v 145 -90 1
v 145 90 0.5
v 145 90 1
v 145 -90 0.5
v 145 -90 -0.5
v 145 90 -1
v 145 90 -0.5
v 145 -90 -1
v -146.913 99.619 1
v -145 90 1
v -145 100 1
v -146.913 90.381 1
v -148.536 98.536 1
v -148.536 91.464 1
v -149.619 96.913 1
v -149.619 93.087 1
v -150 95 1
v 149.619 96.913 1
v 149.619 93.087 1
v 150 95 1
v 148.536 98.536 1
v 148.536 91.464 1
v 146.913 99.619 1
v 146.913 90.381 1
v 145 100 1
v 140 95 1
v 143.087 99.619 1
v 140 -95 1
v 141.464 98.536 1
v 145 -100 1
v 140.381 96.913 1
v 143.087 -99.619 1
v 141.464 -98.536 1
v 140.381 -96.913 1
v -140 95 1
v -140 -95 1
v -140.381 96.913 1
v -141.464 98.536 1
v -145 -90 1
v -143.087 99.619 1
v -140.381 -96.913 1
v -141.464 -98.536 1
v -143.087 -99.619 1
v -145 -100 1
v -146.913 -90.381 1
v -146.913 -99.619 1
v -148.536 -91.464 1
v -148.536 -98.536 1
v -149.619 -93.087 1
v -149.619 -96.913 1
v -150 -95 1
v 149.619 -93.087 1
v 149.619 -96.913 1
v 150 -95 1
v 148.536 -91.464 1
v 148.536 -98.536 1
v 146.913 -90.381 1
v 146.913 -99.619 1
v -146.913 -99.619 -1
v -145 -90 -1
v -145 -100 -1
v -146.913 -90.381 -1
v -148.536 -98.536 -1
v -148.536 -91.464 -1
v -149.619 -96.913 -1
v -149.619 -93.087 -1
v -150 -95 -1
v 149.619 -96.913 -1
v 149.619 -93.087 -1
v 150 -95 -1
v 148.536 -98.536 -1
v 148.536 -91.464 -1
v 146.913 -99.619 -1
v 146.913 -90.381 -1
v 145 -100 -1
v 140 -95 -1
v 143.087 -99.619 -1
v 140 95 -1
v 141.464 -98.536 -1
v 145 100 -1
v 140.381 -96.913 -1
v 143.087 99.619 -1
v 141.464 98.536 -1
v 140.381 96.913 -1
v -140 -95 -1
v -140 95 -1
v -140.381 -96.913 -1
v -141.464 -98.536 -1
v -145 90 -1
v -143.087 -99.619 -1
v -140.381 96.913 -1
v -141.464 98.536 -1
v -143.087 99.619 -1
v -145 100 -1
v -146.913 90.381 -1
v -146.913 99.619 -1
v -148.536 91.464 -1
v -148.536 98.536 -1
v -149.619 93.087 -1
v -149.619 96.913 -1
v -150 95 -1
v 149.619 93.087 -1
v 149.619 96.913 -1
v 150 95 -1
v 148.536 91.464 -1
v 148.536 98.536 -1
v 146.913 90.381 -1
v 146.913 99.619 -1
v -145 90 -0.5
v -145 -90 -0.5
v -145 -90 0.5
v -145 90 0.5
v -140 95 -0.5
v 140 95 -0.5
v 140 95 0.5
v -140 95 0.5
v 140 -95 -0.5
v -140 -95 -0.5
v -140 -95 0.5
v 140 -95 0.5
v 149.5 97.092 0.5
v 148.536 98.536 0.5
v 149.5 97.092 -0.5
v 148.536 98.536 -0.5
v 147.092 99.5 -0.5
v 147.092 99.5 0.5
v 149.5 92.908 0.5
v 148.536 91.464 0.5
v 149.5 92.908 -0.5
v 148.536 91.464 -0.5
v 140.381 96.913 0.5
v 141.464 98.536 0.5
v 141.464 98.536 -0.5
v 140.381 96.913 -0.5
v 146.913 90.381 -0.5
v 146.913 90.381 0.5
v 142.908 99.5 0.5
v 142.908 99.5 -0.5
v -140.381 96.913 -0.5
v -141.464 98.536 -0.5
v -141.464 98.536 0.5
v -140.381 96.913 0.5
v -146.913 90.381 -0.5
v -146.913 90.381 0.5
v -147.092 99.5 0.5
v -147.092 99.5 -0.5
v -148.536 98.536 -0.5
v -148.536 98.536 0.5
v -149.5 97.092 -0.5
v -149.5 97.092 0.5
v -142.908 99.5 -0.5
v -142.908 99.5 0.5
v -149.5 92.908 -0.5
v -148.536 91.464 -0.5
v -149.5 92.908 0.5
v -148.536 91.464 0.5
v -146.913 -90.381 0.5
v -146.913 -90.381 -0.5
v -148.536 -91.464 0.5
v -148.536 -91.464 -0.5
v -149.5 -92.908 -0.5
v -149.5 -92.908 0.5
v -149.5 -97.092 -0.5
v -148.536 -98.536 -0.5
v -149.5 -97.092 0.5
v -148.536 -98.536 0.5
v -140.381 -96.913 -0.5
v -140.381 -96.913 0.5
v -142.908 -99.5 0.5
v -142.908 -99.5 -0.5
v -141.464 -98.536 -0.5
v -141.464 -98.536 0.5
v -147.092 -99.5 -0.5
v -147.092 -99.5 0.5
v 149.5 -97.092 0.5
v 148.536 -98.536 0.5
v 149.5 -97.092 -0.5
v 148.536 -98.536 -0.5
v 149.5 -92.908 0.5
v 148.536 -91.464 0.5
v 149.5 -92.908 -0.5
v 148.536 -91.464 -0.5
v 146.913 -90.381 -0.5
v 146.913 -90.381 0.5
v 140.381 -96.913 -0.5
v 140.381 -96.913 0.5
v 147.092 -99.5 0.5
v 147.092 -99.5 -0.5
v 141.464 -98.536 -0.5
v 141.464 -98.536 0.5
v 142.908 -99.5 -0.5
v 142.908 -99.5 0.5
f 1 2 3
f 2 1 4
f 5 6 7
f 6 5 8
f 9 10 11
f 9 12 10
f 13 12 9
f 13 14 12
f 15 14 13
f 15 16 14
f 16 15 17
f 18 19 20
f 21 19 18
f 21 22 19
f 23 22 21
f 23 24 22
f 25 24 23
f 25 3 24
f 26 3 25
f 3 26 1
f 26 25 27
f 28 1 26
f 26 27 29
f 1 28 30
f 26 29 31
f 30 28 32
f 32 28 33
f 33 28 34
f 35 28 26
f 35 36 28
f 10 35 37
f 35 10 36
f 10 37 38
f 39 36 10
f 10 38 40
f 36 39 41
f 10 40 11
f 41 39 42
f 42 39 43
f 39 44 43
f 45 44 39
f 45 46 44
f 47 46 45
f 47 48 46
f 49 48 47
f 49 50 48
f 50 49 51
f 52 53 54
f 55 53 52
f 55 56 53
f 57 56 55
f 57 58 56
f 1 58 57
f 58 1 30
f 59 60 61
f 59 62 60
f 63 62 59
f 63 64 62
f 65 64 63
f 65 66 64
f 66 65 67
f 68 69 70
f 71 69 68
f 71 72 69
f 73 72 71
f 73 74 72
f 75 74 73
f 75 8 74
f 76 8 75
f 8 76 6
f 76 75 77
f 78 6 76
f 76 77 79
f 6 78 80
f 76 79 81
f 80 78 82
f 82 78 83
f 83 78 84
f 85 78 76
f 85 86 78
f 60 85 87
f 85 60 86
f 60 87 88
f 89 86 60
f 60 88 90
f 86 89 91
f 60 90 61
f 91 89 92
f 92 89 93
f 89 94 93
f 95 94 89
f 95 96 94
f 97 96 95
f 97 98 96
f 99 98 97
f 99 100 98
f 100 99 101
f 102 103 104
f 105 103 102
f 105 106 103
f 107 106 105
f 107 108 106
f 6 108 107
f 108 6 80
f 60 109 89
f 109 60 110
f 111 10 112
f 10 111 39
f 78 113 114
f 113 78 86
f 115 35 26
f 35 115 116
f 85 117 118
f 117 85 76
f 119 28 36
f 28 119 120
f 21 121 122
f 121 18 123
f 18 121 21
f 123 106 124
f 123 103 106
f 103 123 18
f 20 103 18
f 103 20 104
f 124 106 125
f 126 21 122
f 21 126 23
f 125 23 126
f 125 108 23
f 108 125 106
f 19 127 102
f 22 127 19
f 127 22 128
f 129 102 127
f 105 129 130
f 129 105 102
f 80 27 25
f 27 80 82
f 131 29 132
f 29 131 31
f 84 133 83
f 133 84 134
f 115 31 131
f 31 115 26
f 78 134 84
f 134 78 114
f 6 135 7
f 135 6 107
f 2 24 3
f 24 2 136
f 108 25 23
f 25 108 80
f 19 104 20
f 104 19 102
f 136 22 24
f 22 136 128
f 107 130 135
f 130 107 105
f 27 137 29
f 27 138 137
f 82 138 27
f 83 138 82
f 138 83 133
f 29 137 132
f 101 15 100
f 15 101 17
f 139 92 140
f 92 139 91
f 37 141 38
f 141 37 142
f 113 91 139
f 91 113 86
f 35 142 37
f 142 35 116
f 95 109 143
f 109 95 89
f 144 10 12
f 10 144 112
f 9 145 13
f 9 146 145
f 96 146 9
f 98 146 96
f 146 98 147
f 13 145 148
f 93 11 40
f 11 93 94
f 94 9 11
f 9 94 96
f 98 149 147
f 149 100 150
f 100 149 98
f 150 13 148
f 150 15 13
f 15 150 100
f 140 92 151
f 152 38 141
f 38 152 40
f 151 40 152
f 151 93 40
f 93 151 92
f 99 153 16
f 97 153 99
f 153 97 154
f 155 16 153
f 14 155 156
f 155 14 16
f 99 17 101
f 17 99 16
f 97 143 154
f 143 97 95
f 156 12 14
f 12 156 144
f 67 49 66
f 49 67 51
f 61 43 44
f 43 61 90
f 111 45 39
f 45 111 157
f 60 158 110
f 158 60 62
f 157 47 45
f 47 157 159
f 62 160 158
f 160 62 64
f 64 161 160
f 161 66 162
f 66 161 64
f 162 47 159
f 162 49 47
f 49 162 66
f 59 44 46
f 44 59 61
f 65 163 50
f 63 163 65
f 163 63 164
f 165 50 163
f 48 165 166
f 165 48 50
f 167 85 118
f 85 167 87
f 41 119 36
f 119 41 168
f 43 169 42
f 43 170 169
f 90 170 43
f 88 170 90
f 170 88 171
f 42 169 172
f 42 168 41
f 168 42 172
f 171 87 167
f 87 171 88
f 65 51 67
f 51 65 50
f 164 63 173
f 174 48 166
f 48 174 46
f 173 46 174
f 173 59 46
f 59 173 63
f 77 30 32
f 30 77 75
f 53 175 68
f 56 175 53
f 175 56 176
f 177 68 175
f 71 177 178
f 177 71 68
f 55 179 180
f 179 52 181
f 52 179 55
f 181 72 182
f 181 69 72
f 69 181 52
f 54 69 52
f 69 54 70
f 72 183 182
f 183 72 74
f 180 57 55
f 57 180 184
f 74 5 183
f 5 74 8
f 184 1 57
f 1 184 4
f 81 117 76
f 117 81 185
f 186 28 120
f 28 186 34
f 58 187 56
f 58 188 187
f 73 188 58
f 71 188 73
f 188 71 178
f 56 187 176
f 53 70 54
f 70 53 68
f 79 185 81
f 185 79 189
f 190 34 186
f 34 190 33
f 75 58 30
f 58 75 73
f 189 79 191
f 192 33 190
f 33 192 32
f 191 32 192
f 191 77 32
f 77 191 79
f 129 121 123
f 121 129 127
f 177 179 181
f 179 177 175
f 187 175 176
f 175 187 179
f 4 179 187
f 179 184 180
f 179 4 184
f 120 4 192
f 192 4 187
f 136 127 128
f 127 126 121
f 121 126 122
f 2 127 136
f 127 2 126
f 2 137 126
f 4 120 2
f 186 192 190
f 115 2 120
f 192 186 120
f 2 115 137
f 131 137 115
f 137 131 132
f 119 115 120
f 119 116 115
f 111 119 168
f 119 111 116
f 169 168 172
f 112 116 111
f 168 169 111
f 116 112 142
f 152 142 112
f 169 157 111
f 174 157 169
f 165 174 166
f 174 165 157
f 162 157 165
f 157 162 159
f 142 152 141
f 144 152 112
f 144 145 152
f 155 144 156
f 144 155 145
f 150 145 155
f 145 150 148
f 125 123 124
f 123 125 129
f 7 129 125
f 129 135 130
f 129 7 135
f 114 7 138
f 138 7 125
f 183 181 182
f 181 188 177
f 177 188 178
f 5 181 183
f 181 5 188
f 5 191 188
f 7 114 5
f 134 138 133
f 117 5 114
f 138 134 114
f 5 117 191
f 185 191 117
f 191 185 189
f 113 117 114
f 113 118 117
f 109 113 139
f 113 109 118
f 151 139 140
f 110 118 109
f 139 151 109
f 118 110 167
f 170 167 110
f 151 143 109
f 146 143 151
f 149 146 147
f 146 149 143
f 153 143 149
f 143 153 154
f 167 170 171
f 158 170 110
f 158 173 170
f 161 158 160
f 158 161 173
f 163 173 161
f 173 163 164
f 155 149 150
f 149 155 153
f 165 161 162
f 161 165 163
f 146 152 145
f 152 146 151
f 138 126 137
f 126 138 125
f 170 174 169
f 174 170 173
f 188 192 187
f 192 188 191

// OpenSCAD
// Parameters
sheet_length = 300; //[150:600:1]
sheet_width = 200; //[100:400:1]
sheet_thickness = 2; //[1:6:0.1]
corner_radius = 5; //[2.5:10:0.5]
chamfer_size = 0.5; //[0.25:1.5:0.05]
edge_overlap = 1; //[0.5:2:0.1]
texture_depth = 0; //[0:0:0]
label_depth = 0; //[0:0:0]

// Base Shapes
module sheet_plate() {
  cube([sheet_length, sheet_width, sheet_thickness], center=true);
}

module rounded_corners() {
  cube([sheet_length - 2*corner_radius, sheet_width - 2*corner_radius, sheet_thickness], center=true);
}

module corner_cyl_1() {
  translate([sheet_length/2 - corner_radius, sheet_width/2 - corner_radius, 0])
    cylinder(r=corner_radius, h=sheet_thickness, center=true);
}

module corner_cyl_2() {
  translate([-sheet_length/2 + corner_radius, sheet_width/2 - corner_radius, 0])
    cylinder(r=corner_radius, h=sheet_thickness, center=true);
}

module corner_cyl_3() {
  translate([-sheet_length/2 + corner_radius, -sheet_width/2 + corner_radius, 0])
    cylinder(r=corner_radius, h=sheet_thickness, center=true);
}

module corner_cyl_4() {
  translate([sheet_length/2 - corner_radius, -sheet_width/2 + corner_radius, 0])
    cylinder(r=corner_radius, h=sheet_thickness, center=true);
}

module edge_chamfer() {
  cube([sheet_length - 2*chamfer_size, sheet_width - 2*chamfer_size, sheet_thickness - 2*chamfer_size], center=true);
}

module surface_weave_texture() {
  translate([0, 0, sheet_thickness/2 - texture_depth/2])
    cube([sheet_length, sheet_width, texture_depth], center=true);
}

module engraved_label() {
  translate([0, 0, sheet_thickness/2 - label_depth/2])
    cube([sheet_length/3, sheet_width/6, label_depth], center=true);
}

// Operations
module rounded_plate_union() {
  union() {
    rounded_corners();
    corner_cyl_1();
    corner_cyl_2();
    corner_cyl_3();
    corner_cyl_4();
  }
}

module rounded_plate() {
  intersection() {
    sheet_plate();
    rounded_plate_union();
  }
}

module chamfered_plate() {
  difference() {
    rounded_plate();
    edge_chamfer();
  }
}

module final_model() {
  union() {
    chamfered_plate();
    surface_weave_texture();
    engraved_label();
  }
}

// Final Output
final_model();
